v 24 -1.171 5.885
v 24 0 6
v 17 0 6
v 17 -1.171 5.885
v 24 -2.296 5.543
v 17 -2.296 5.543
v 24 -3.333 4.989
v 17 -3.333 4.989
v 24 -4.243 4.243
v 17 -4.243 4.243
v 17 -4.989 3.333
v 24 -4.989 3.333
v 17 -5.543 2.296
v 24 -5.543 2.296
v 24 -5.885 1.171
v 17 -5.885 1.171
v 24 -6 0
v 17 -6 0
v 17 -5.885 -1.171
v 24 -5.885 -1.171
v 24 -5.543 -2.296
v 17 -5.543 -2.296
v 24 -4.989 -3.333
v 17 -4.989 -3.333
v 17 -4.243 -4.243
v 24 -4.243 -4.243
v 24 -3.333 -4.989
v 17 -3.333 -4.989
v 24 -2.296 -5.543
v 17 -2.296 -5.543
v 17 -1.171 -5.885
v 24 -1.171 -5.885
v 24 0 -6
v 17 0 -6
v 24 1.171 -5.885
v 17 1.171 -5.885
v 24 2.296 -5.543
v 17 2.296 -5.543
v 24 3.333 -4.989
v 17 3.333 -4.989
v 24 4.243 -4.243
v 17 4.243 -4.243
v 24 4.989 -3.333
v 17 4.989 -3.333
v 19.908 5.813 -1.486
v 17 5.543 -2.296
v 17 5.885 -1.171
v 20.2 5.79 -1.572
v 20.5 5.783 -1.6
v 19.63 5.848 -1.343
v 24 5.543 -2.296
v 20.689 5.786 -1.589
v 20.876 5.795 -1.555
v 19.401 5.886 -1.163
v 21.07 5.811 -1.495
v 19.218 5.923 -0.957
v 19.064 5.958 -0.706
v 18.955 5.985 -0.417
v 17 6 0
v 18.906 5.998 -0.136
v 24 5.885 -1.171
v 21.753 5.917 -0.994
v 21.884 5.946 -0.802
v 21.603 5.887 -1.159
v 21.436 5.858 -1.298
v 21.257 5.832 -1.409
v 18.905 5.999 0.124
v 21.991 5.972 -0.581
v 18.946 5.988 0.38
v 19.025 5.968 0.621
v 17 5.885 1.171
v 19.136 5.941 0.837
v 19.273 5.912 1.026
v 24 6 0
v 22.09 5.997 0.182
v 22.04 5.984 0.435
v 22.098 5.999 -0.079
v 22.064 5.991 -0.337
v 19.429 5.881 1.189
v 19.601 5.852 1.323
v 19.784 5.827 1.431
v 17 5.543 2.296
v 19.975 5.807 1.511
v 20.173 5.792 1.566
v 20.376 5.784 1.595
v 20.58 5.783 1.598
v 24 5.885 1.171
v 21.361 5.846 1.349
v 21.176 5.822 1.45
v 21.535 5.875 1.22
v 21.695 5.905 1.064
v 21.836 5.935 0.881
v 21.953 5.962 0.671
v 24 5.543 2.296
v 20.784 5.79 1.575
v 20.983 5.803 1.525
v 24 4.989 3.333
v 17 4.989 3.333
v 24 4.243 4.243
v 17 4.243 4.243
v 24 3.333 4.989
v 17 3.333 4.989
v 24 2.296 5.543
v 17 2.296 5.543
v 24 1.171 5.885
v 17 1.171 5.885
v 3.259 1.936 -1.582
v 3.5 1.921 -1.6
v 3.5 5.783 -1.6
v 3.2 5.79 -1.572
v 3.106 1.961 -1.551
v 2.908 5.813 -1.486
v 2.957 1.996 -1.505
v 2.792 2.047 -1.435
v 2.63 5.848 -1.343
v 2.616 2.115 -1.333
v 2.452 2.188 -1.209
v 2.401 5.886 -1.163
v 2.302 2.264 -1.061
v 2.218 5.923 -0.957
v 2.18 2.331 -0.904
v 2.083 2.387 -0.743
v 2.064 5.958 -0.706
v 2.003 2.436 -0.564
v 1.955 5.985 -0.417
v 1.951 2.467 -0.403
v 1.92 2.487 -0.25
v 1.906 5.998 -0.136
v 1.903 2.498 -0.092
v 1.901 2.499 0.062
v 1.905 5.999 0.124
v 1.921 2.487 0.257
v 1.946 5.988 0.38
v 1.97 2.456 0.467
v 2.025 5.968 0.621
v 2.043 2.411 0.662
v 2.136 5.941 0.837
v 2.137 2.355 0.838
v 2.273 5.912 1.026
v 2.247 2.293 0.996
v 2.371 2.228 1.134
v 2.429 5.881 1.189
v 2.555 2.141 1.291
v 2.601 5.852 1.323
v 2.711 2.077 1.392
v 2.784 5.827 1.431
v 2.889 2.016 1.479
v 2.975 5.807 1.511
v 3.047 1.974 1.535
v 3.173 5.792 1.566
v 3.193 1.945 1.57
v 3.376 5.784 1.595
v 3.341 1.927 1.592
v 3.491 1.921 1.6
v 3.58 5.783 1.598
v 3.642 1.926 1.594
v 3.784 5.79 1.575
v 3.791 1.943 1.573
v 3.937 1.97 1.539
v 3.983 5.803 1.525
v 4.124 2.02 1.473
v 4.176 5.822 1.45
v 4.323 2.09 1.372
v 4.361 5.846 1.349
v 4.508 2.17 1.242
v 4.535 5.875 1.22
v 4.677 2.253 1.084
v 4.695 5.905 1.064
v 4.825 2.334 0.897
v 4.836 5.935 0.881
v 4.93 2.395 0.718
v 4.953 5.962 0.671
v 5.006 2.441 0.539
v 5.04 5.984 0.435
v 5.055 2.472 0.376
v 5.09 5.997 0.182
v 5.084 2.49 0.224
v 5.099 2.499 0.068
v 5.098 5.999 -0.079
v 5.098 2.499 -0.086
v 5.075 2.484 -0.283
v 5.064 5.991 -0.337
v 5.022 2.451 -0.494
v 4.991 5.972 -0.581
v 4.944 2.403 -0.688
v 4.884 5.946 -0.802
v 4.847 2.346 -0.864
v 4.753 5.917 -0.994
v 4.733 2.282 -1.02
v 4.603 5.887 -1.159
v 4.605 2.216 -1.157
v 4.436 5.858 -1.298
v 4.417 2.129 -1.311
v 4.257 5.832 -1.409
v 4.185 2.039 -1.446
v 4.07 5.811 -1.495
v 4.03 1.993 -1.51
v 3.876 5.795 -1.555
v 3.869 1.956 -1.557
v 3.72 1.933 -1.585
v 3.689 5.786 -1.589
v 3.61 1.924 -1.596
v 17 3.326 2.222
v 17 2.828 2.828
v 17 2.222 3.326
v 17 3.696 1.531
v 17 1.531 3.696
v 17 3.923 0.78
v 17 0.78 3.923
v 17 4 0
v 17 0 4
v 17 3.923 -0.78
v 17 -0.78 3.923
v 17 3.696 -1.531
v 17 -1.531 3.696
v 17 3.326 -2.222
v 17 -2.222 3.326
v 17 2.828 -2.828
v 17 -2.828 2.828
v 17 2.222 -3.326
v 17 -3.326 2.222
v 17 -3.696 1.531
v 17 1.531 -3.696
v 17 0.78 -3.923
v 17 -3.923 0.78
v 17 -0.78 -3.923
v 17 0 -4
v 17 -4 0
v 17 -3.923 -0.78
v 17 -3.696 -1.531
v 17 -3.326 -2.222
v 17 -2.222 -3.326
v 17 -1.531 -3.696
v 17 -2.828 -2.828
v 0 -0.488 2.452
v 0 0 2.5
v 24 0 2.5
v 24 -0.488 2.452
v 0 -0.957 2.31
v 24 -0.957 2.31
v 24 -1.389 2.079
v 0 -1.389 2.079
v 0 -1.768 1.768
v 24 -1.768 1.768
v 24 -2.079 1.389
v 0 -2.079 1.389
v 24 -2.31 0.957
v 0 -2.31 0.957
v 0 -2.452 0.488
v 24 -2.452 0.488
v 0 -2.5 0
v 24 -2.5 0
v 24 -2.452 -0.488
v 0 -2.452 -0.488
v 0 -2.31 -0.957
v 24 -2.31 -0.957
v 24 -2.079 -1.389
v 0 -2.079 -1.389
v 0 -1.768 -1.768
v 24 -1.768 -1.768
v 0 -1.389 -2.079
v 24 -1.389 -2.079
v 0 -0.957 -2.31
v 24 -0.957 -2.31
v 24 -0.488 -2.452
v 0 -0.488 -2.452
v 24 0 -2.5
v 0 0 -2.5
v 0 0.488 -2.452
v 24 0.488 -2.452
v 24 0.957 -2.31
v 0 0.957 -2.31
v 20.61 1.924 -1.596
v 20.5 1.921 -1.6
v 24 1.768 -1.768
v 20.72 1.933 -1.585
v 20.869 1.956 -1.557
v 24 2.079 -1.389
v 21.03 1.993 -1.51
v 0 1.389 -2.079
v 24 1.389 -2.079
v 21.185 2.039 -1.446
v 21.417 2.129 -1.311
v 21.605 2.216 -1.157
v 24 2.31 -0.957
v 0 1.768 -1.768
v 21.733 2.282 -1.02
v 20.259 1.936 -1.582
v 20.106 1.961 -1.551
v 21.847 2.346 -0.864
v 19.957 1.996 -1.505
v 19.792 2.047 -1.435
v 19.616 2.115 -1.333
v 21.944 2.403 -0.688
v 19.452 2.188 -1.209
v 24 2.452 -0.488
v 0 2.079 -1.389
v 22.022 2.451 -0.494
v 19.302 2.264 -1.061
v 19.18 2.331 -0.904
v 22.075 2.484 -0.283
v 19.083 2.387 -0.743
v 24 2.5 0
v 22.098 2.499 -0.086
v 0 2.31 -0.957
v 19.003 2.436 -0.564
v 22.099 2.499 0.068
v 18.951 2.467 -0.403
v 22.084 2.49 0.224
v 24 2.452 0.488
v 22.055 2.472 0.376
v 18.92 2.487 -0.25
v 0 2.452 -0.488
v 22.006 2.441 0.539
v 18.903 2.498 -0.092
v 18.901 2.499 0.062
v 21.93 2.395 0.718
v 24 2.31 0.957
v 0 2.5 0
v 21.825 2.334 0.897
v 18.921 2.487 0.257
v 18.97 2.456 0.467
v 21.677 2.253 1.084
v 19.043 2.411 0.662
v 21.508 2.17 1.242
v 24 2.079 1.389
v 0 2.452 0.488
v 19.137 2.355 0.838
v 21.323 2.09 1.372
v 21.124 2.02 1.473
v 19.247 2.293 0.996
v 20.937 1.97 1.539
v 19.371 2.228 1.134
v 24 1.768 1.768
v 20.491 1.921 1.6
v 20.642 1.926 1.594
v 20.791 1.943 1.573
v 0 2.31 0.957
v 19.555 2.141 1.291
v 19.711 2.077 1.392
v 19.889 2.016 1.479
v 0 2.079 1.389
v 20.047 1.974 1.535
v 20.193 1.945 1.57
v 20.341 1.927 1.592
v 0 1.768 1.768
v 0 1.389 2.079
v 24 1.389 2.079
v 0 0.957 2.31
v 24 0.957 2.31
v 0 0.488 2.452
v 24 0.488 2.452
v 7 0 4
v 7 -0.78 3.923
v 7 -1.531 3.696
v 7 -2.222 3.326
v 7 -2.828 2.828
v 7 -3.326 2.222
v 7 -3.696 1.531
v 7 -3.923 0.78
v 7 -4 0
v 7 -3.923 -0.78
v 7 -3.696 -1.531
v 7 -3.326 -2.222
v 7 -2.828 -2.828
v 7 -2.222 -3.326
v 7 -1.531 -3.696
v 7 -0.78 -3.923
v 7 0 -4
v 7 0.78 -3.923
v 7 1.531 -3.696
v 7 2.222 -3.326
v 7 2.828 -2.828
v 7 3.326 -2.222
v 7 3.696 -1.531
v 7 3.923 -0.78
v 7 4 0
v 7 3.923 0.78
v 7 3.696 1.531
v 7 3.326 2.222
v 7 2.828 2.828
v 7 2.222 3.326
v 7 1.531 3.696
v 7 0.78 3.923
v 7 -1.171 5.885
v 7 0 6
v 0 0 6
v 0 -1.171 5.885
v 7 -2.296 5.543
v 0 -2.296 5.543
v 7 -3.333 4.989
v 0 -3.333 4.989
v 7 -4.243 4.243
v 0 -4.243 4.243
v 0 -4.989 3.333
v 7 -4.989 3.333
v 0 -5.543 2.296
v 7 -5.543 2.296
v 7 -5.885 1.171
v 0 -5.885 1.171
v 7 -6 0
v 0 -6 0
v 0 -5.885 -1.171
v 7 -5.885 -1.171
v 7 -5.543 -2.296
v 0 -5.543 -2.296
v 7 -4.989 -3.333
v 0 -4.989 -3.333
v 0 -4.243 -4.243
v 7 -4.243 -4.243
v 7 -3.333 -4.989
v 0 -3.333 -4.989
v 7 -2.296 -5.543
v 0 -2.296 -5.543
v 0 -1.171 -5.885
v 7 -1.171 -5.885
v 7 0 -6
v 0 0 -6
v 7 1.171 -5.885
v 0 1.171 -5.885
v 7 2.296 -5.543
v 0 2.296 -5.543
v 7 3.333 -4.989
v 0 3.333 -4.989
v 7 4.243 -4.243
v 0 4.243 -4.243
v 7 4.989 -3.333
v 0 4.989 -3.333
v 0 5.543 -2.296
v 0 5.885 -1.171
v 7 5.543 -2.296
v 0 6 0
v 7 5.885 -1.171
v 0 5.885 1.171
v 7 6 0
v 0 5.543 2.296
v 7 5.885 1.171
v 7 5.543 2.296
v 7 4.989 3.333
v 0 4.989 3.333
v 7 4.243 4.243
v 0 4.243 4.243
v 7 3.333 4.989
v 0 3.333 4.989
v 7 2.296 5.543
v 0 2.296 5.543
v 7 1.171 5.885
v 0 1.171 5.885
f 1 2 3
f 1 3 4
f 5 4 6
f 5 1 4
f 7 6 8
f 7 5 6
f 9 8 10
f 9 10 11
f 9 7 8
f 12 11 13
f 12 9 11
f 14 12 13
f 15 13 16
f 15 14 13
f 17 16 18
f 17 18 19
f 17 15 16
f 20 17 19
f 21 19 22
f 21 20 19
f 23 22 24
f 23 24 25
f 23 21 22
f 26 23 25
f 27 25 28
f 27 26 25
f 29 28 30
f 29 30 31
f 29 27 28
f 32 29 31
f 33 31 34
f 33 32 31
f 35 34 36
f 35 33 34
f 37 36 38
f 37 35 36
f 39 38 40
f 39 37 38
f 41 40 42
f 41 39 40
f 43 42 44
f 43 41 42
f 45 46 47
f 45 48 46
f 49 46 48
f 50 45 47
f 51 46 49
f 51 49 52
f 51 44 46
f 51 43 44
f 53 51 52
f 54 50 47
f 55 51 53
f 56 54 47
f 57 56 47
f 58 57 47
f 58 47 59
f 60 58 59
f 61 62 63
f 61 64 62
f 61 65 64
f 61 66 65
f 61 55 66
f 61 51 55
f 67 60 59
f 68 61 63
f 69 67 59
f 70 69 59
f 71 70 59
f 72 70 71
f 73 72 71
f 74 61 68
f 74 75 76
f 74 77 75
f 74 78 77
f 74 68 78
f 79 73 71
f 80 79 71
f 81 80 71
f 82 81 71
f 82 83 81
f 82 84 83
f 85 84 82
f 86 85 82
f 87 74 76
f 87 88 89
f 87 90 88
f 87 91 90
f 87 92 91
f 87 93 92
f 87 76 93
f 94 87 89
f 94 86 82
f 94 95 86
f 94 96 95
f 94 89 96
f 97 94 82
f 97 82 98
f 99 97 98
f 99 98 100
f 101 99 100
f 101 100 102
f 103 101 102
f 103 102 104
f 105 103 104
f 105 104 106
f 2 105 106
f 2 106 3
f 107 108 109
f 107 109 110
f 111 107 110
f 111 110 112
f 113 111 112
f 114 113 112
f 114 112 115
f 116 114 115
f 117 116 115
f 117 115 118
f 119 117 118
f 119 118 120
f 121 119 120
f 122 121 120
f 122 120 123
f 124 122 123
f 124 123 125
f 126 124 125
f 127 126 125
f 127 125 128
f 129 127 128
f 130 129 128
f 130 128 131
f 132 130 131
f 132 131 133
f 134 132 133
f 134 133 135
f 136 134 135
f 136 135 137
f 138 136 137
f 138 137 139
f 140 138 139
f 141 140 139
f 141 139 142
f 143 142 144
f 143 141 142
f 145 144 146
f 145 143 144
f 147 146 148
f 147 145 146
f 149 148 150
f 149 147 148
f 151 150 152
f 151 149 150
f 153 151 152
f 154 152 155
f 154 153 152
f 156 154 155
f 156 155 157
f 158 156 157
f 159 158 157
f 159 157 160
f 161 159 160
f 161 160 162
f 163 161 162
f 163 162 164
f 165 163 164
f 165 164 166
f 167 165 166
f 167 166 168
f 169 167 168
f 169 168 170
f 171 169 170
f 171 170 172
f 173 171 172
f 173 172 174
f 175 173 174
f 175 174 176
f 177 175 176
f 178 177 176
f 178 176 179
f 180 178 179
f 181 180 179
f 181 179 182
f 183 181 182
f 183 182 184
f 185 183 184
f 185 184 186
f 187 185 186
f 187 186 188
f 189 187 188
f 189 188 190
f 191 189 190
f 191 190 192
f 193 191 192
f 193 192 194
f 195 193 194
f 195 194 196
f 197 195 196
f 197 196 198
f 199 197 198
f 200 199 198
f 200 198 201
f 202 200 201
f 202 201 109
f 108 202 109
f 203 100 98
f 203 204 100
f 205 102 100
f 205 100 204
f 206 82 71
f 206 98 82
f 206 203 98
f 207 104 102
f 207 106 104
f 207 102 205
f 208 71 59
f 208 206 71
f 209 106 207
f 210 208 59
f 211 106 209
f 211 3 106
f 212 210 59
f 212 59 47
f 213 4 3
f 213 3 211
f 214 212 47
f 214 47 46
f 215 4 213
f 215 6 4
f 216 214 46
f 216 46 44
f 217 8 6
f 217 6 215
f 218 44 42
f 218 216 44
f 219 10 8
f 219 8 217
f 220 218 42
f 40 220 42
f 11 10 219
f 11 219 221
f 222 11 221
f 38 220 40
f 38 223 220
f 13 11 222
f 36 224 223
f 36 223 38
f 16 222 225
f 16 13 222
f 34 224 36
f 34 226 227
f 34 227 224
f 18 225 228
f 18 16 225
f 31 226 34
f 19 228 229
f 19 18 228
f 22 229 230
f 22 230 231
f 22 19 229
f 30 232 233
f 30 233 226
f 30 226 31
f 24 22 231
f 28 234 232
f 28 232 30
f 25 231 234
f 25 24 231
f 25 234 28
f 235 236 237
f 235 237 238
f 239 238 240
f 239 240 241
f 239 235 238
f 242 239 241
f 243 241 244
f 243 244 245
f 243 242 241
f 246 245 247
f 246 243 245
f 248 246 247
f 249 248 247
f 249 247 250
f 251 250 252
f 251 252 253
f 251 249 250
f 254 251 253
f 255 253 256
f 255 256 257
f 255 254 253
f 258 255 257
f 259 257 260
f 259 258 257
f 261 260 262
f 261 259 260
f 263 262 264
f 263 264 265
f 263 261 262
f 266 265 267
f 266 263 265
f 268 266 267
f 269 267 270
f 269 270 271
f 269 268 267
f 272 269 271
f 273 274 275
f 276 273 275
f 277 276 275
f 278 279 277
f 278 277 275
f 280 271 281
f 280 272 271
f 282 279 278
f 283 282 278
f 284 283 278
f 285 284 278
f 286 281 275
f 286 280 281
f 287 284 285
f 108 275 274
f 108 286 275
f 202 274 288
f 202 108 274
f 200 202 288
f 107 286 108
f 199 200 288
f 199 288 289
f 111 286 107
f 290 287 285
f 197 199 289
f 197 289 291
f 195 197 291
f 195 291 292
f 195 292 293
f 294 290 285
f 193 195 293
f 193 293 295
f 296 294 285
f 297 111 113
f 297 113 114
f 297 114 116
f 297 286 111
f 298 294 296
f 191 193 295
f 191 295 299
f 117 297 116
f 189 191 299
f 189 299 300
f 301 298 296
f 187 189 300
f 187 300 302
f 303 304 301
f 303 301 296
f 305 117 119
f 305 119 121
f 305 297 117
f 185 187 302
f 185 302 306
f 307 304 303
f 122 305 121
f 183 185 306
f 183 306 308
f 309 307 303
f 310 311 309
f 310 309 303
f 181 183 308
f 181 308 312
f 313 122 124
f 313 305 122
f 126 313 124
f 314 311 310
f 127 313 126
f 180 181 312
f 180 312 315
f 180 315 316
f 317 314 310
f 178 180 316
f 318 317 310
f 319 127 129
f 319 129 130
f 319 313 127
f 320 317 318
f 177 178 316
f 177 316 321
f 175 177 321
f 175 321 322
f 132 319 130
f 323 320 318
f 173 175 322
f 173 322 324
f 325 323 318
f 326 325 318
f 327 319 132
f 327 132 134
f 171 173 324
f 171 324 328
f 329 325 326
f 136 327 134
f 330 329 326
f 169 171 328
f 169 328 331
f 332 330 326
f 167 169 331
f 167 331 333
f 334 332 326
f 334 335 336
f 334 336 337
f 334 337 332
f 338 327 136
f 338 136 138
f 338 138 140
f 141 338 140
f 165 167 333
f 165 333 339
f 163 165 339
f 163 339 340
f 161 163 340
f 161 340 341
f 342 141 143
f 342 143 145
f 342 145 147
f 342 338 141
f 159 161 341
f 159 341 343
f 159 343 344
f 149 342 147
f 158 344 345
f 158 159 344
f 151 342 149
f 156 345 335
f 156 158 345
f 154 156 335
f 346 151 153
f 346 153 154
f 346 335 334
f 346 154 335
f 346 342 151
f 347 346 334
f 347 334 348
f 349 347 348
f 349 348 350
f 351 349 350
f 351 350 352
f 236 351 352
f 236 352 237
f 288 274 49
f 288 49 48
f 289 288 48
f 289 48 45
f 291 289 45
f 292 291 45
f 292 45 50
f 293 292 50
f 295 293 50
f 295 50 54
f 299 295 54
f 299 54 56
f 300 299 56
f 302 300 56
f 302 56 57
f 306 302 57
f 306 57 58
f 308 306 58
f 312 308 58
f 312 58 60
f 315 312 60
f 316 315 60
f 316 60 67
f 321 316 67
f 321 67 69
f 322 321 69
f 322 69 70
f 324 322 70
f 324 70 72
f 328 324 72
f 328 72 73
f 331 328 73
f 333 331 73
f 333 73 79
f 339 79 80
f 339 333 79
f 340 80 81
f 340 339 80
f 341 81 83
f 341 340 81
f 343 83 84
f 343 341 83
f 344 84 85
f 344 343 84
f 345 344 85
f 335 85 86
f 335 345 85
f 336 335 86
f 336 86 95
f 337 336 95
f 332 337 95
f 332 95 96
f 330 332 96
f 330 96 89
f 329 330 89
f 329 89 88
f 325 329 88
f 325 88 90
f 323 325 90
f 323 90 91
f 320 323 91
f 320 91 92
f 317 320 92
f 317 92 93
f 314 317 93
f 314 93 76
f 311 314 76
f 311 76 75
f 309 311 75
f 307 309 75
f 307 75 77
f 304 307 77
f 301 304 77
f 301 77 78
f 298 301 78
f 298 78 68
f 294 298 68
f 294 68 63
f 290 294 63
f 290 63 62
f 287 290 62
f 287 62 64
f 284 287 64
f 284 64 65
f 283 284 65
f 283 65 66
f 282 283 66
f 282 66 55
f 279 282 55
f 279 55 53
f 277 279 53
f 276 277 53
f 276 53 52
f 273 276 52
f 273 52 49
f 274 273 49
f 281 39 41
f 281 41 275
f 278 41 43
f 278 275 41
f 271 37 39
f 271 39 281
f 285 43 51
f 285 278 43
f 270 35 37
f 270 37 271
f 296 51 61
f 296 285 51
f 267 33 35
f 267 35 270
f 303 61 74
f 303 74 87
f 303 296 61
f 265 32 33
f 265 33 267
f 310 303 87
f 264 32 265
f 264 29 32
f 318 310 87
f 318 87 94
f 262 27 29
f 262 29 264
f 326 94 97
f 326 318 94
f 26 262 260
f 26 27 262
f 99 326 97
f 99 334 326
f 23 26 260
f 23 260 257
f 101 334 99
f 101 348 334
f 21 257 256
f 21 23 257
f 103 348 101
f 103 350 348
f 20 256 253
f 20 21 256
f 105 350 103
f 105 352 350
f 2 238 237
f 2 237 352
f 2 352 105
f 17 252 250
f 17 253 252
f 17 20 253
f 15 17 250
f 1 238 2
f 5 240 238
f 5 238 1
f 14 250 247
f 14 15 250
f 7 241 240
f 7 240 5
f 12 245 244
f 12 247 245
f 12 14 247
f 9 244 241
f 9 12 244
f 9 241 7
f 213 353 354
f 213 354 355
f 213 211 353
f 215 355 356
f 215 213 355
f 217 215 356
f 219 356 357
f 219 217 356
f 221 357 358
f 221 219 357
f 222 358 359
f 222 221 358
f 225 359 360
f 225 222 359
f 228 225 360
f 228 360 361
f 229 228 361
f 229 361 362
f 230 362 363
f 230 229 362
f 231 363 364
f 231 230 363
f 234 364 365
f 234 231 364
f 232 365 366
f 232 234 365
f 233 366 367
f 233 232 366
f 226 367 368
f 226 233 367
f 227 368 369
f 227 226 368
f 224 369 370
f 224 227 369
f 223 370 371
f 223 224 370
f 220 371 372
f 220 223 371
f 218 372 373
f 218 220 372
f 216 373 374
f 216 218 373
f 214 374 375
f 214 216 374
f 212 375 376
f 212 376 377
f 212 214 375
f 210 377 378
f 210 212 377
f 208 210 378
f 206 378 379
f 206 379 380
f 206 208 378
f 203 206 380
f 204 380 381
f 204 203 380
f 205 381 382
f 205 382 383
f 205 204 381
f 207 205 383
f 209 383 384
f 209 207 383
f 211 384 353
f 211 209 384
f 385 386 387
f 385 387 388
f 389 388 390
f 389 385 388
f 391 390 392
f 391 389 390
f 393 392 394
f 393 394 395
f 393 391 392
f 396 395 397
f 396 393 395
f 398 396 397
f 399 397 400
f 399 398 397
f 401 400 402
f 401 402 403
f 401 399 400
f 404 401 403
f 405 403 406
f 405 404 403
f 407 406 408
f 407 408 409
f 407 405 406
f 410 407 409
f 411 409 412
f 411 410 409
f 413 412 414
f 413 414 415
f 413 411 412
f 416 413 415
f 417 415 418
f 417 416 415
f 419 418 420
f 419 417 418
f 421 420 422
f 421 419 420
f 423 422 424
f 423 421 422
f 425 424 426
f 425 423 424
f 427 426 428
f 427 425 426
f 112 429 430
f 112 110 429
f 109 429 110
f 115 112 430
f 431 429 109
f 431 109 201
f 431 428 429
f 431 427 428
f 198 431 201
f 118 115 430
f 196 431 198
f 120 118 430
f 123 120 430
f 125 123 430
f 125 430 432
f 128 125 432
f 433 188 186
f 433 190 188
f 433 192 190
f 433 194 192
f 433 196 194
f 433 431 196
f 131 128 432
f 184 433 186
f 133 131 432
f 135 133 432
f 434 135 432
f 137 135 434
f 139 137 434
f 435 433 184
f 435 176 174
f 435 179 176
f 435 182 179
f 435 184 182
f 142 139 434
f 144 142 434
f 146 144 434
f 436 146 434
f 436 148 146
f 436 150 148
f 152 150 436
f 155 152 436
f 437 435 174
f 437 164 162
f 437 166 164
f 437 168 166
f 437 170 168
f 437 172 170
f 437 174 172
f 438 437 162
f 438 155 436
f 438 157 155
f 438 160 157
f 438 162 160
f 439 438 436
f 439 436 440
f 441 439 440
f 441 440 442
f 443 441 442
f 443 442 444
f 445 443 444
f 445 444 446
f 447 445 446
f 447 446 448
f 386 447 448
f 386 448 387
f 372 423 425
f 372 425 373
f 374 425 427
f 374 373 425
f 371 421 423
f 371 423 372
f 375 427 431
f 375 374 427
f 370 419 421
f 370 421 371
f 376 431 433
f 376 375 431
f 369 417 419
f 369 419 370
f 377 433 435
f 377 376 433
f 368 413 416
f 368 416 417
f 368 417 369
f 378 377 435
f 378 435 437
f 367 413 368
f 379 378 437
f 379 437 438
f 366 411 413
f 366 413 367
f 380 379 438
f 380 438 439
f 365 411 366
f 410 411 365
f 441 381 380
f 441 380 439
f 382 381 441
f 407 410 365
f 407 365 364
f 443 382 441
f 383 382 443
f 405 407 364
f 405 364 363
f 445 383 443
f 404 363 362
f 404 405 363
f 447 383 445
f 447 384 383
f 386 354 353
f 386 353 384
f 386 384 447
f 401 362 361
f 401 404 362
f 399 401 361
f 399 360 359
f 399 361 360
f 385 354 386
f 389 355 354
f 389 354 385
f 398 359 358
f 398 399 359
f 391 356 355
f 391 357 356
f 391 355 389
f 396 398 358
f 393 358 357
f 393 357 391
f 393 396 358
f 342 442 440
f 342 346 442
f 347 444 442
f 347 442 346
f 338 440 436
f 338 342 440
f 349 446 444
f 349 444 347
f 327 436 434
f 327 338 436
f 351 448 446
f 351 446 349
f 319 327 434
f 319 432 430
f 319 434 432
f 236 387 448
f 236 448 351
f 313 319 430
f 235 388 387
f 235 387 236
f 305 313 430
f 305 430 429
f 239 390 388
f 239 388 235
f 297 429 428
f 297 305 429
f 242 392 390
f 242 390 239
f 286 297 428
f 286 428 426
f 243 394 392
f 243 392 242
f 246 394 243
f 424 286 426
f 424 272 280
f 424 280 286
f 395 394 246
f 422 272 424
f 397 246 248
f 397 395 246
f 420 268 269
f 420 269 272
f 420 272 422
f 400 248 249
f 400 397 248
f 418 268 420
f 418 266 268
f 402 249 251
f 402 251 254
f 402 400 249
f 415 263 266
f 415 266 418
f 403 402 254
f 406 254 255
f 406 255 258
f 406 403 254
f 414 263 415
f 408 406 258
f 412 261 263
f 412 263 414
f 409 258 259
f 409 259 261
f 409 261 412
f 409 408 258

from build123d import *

# Parameters (mm, degrees)
SKETCH2_R          = 1.6
CUT_EXTRUDE1_DEPTH = 10


with BuildPart() as part:
    # Sketch1 → Revolve1 (revolve)
    with BuildSketch(Plane.XY, mode=Mode.PRIVATE) as revolve1_sk:
        Polygon((0, -2.5), (0, -6), (7, -6), (7, -4), (17, -4), (17, -6), (24, -6), (24, -2.5), align=None)
    revolve(revolve1_sk.sketch.rotate(Axis((0, 0, 0), (1, 0, 0)), 270), axis=Axis((0, 0, 0), (1, 0, 0)))

    # Sketch2 → Cut-Extrude1 (cut)
    with BuildSketch(Plane(origin=(0, 0, 0), x_dir=(1, 0, 0), z_dir=(0, 1, 0))):
        with Locations(Location((3.5, 0, 0), (0, 0, 90))):
            Circle(SKETCH2_R)
        with Locations(Location((20.5, 0, 0), (0, 0, 90))):
            Circle(SKETCH2_R)
    extrude(amount=CUT_EXTRUDE1_DEPTH, mode=Mode.SUBTRACT)


solid = part.part
